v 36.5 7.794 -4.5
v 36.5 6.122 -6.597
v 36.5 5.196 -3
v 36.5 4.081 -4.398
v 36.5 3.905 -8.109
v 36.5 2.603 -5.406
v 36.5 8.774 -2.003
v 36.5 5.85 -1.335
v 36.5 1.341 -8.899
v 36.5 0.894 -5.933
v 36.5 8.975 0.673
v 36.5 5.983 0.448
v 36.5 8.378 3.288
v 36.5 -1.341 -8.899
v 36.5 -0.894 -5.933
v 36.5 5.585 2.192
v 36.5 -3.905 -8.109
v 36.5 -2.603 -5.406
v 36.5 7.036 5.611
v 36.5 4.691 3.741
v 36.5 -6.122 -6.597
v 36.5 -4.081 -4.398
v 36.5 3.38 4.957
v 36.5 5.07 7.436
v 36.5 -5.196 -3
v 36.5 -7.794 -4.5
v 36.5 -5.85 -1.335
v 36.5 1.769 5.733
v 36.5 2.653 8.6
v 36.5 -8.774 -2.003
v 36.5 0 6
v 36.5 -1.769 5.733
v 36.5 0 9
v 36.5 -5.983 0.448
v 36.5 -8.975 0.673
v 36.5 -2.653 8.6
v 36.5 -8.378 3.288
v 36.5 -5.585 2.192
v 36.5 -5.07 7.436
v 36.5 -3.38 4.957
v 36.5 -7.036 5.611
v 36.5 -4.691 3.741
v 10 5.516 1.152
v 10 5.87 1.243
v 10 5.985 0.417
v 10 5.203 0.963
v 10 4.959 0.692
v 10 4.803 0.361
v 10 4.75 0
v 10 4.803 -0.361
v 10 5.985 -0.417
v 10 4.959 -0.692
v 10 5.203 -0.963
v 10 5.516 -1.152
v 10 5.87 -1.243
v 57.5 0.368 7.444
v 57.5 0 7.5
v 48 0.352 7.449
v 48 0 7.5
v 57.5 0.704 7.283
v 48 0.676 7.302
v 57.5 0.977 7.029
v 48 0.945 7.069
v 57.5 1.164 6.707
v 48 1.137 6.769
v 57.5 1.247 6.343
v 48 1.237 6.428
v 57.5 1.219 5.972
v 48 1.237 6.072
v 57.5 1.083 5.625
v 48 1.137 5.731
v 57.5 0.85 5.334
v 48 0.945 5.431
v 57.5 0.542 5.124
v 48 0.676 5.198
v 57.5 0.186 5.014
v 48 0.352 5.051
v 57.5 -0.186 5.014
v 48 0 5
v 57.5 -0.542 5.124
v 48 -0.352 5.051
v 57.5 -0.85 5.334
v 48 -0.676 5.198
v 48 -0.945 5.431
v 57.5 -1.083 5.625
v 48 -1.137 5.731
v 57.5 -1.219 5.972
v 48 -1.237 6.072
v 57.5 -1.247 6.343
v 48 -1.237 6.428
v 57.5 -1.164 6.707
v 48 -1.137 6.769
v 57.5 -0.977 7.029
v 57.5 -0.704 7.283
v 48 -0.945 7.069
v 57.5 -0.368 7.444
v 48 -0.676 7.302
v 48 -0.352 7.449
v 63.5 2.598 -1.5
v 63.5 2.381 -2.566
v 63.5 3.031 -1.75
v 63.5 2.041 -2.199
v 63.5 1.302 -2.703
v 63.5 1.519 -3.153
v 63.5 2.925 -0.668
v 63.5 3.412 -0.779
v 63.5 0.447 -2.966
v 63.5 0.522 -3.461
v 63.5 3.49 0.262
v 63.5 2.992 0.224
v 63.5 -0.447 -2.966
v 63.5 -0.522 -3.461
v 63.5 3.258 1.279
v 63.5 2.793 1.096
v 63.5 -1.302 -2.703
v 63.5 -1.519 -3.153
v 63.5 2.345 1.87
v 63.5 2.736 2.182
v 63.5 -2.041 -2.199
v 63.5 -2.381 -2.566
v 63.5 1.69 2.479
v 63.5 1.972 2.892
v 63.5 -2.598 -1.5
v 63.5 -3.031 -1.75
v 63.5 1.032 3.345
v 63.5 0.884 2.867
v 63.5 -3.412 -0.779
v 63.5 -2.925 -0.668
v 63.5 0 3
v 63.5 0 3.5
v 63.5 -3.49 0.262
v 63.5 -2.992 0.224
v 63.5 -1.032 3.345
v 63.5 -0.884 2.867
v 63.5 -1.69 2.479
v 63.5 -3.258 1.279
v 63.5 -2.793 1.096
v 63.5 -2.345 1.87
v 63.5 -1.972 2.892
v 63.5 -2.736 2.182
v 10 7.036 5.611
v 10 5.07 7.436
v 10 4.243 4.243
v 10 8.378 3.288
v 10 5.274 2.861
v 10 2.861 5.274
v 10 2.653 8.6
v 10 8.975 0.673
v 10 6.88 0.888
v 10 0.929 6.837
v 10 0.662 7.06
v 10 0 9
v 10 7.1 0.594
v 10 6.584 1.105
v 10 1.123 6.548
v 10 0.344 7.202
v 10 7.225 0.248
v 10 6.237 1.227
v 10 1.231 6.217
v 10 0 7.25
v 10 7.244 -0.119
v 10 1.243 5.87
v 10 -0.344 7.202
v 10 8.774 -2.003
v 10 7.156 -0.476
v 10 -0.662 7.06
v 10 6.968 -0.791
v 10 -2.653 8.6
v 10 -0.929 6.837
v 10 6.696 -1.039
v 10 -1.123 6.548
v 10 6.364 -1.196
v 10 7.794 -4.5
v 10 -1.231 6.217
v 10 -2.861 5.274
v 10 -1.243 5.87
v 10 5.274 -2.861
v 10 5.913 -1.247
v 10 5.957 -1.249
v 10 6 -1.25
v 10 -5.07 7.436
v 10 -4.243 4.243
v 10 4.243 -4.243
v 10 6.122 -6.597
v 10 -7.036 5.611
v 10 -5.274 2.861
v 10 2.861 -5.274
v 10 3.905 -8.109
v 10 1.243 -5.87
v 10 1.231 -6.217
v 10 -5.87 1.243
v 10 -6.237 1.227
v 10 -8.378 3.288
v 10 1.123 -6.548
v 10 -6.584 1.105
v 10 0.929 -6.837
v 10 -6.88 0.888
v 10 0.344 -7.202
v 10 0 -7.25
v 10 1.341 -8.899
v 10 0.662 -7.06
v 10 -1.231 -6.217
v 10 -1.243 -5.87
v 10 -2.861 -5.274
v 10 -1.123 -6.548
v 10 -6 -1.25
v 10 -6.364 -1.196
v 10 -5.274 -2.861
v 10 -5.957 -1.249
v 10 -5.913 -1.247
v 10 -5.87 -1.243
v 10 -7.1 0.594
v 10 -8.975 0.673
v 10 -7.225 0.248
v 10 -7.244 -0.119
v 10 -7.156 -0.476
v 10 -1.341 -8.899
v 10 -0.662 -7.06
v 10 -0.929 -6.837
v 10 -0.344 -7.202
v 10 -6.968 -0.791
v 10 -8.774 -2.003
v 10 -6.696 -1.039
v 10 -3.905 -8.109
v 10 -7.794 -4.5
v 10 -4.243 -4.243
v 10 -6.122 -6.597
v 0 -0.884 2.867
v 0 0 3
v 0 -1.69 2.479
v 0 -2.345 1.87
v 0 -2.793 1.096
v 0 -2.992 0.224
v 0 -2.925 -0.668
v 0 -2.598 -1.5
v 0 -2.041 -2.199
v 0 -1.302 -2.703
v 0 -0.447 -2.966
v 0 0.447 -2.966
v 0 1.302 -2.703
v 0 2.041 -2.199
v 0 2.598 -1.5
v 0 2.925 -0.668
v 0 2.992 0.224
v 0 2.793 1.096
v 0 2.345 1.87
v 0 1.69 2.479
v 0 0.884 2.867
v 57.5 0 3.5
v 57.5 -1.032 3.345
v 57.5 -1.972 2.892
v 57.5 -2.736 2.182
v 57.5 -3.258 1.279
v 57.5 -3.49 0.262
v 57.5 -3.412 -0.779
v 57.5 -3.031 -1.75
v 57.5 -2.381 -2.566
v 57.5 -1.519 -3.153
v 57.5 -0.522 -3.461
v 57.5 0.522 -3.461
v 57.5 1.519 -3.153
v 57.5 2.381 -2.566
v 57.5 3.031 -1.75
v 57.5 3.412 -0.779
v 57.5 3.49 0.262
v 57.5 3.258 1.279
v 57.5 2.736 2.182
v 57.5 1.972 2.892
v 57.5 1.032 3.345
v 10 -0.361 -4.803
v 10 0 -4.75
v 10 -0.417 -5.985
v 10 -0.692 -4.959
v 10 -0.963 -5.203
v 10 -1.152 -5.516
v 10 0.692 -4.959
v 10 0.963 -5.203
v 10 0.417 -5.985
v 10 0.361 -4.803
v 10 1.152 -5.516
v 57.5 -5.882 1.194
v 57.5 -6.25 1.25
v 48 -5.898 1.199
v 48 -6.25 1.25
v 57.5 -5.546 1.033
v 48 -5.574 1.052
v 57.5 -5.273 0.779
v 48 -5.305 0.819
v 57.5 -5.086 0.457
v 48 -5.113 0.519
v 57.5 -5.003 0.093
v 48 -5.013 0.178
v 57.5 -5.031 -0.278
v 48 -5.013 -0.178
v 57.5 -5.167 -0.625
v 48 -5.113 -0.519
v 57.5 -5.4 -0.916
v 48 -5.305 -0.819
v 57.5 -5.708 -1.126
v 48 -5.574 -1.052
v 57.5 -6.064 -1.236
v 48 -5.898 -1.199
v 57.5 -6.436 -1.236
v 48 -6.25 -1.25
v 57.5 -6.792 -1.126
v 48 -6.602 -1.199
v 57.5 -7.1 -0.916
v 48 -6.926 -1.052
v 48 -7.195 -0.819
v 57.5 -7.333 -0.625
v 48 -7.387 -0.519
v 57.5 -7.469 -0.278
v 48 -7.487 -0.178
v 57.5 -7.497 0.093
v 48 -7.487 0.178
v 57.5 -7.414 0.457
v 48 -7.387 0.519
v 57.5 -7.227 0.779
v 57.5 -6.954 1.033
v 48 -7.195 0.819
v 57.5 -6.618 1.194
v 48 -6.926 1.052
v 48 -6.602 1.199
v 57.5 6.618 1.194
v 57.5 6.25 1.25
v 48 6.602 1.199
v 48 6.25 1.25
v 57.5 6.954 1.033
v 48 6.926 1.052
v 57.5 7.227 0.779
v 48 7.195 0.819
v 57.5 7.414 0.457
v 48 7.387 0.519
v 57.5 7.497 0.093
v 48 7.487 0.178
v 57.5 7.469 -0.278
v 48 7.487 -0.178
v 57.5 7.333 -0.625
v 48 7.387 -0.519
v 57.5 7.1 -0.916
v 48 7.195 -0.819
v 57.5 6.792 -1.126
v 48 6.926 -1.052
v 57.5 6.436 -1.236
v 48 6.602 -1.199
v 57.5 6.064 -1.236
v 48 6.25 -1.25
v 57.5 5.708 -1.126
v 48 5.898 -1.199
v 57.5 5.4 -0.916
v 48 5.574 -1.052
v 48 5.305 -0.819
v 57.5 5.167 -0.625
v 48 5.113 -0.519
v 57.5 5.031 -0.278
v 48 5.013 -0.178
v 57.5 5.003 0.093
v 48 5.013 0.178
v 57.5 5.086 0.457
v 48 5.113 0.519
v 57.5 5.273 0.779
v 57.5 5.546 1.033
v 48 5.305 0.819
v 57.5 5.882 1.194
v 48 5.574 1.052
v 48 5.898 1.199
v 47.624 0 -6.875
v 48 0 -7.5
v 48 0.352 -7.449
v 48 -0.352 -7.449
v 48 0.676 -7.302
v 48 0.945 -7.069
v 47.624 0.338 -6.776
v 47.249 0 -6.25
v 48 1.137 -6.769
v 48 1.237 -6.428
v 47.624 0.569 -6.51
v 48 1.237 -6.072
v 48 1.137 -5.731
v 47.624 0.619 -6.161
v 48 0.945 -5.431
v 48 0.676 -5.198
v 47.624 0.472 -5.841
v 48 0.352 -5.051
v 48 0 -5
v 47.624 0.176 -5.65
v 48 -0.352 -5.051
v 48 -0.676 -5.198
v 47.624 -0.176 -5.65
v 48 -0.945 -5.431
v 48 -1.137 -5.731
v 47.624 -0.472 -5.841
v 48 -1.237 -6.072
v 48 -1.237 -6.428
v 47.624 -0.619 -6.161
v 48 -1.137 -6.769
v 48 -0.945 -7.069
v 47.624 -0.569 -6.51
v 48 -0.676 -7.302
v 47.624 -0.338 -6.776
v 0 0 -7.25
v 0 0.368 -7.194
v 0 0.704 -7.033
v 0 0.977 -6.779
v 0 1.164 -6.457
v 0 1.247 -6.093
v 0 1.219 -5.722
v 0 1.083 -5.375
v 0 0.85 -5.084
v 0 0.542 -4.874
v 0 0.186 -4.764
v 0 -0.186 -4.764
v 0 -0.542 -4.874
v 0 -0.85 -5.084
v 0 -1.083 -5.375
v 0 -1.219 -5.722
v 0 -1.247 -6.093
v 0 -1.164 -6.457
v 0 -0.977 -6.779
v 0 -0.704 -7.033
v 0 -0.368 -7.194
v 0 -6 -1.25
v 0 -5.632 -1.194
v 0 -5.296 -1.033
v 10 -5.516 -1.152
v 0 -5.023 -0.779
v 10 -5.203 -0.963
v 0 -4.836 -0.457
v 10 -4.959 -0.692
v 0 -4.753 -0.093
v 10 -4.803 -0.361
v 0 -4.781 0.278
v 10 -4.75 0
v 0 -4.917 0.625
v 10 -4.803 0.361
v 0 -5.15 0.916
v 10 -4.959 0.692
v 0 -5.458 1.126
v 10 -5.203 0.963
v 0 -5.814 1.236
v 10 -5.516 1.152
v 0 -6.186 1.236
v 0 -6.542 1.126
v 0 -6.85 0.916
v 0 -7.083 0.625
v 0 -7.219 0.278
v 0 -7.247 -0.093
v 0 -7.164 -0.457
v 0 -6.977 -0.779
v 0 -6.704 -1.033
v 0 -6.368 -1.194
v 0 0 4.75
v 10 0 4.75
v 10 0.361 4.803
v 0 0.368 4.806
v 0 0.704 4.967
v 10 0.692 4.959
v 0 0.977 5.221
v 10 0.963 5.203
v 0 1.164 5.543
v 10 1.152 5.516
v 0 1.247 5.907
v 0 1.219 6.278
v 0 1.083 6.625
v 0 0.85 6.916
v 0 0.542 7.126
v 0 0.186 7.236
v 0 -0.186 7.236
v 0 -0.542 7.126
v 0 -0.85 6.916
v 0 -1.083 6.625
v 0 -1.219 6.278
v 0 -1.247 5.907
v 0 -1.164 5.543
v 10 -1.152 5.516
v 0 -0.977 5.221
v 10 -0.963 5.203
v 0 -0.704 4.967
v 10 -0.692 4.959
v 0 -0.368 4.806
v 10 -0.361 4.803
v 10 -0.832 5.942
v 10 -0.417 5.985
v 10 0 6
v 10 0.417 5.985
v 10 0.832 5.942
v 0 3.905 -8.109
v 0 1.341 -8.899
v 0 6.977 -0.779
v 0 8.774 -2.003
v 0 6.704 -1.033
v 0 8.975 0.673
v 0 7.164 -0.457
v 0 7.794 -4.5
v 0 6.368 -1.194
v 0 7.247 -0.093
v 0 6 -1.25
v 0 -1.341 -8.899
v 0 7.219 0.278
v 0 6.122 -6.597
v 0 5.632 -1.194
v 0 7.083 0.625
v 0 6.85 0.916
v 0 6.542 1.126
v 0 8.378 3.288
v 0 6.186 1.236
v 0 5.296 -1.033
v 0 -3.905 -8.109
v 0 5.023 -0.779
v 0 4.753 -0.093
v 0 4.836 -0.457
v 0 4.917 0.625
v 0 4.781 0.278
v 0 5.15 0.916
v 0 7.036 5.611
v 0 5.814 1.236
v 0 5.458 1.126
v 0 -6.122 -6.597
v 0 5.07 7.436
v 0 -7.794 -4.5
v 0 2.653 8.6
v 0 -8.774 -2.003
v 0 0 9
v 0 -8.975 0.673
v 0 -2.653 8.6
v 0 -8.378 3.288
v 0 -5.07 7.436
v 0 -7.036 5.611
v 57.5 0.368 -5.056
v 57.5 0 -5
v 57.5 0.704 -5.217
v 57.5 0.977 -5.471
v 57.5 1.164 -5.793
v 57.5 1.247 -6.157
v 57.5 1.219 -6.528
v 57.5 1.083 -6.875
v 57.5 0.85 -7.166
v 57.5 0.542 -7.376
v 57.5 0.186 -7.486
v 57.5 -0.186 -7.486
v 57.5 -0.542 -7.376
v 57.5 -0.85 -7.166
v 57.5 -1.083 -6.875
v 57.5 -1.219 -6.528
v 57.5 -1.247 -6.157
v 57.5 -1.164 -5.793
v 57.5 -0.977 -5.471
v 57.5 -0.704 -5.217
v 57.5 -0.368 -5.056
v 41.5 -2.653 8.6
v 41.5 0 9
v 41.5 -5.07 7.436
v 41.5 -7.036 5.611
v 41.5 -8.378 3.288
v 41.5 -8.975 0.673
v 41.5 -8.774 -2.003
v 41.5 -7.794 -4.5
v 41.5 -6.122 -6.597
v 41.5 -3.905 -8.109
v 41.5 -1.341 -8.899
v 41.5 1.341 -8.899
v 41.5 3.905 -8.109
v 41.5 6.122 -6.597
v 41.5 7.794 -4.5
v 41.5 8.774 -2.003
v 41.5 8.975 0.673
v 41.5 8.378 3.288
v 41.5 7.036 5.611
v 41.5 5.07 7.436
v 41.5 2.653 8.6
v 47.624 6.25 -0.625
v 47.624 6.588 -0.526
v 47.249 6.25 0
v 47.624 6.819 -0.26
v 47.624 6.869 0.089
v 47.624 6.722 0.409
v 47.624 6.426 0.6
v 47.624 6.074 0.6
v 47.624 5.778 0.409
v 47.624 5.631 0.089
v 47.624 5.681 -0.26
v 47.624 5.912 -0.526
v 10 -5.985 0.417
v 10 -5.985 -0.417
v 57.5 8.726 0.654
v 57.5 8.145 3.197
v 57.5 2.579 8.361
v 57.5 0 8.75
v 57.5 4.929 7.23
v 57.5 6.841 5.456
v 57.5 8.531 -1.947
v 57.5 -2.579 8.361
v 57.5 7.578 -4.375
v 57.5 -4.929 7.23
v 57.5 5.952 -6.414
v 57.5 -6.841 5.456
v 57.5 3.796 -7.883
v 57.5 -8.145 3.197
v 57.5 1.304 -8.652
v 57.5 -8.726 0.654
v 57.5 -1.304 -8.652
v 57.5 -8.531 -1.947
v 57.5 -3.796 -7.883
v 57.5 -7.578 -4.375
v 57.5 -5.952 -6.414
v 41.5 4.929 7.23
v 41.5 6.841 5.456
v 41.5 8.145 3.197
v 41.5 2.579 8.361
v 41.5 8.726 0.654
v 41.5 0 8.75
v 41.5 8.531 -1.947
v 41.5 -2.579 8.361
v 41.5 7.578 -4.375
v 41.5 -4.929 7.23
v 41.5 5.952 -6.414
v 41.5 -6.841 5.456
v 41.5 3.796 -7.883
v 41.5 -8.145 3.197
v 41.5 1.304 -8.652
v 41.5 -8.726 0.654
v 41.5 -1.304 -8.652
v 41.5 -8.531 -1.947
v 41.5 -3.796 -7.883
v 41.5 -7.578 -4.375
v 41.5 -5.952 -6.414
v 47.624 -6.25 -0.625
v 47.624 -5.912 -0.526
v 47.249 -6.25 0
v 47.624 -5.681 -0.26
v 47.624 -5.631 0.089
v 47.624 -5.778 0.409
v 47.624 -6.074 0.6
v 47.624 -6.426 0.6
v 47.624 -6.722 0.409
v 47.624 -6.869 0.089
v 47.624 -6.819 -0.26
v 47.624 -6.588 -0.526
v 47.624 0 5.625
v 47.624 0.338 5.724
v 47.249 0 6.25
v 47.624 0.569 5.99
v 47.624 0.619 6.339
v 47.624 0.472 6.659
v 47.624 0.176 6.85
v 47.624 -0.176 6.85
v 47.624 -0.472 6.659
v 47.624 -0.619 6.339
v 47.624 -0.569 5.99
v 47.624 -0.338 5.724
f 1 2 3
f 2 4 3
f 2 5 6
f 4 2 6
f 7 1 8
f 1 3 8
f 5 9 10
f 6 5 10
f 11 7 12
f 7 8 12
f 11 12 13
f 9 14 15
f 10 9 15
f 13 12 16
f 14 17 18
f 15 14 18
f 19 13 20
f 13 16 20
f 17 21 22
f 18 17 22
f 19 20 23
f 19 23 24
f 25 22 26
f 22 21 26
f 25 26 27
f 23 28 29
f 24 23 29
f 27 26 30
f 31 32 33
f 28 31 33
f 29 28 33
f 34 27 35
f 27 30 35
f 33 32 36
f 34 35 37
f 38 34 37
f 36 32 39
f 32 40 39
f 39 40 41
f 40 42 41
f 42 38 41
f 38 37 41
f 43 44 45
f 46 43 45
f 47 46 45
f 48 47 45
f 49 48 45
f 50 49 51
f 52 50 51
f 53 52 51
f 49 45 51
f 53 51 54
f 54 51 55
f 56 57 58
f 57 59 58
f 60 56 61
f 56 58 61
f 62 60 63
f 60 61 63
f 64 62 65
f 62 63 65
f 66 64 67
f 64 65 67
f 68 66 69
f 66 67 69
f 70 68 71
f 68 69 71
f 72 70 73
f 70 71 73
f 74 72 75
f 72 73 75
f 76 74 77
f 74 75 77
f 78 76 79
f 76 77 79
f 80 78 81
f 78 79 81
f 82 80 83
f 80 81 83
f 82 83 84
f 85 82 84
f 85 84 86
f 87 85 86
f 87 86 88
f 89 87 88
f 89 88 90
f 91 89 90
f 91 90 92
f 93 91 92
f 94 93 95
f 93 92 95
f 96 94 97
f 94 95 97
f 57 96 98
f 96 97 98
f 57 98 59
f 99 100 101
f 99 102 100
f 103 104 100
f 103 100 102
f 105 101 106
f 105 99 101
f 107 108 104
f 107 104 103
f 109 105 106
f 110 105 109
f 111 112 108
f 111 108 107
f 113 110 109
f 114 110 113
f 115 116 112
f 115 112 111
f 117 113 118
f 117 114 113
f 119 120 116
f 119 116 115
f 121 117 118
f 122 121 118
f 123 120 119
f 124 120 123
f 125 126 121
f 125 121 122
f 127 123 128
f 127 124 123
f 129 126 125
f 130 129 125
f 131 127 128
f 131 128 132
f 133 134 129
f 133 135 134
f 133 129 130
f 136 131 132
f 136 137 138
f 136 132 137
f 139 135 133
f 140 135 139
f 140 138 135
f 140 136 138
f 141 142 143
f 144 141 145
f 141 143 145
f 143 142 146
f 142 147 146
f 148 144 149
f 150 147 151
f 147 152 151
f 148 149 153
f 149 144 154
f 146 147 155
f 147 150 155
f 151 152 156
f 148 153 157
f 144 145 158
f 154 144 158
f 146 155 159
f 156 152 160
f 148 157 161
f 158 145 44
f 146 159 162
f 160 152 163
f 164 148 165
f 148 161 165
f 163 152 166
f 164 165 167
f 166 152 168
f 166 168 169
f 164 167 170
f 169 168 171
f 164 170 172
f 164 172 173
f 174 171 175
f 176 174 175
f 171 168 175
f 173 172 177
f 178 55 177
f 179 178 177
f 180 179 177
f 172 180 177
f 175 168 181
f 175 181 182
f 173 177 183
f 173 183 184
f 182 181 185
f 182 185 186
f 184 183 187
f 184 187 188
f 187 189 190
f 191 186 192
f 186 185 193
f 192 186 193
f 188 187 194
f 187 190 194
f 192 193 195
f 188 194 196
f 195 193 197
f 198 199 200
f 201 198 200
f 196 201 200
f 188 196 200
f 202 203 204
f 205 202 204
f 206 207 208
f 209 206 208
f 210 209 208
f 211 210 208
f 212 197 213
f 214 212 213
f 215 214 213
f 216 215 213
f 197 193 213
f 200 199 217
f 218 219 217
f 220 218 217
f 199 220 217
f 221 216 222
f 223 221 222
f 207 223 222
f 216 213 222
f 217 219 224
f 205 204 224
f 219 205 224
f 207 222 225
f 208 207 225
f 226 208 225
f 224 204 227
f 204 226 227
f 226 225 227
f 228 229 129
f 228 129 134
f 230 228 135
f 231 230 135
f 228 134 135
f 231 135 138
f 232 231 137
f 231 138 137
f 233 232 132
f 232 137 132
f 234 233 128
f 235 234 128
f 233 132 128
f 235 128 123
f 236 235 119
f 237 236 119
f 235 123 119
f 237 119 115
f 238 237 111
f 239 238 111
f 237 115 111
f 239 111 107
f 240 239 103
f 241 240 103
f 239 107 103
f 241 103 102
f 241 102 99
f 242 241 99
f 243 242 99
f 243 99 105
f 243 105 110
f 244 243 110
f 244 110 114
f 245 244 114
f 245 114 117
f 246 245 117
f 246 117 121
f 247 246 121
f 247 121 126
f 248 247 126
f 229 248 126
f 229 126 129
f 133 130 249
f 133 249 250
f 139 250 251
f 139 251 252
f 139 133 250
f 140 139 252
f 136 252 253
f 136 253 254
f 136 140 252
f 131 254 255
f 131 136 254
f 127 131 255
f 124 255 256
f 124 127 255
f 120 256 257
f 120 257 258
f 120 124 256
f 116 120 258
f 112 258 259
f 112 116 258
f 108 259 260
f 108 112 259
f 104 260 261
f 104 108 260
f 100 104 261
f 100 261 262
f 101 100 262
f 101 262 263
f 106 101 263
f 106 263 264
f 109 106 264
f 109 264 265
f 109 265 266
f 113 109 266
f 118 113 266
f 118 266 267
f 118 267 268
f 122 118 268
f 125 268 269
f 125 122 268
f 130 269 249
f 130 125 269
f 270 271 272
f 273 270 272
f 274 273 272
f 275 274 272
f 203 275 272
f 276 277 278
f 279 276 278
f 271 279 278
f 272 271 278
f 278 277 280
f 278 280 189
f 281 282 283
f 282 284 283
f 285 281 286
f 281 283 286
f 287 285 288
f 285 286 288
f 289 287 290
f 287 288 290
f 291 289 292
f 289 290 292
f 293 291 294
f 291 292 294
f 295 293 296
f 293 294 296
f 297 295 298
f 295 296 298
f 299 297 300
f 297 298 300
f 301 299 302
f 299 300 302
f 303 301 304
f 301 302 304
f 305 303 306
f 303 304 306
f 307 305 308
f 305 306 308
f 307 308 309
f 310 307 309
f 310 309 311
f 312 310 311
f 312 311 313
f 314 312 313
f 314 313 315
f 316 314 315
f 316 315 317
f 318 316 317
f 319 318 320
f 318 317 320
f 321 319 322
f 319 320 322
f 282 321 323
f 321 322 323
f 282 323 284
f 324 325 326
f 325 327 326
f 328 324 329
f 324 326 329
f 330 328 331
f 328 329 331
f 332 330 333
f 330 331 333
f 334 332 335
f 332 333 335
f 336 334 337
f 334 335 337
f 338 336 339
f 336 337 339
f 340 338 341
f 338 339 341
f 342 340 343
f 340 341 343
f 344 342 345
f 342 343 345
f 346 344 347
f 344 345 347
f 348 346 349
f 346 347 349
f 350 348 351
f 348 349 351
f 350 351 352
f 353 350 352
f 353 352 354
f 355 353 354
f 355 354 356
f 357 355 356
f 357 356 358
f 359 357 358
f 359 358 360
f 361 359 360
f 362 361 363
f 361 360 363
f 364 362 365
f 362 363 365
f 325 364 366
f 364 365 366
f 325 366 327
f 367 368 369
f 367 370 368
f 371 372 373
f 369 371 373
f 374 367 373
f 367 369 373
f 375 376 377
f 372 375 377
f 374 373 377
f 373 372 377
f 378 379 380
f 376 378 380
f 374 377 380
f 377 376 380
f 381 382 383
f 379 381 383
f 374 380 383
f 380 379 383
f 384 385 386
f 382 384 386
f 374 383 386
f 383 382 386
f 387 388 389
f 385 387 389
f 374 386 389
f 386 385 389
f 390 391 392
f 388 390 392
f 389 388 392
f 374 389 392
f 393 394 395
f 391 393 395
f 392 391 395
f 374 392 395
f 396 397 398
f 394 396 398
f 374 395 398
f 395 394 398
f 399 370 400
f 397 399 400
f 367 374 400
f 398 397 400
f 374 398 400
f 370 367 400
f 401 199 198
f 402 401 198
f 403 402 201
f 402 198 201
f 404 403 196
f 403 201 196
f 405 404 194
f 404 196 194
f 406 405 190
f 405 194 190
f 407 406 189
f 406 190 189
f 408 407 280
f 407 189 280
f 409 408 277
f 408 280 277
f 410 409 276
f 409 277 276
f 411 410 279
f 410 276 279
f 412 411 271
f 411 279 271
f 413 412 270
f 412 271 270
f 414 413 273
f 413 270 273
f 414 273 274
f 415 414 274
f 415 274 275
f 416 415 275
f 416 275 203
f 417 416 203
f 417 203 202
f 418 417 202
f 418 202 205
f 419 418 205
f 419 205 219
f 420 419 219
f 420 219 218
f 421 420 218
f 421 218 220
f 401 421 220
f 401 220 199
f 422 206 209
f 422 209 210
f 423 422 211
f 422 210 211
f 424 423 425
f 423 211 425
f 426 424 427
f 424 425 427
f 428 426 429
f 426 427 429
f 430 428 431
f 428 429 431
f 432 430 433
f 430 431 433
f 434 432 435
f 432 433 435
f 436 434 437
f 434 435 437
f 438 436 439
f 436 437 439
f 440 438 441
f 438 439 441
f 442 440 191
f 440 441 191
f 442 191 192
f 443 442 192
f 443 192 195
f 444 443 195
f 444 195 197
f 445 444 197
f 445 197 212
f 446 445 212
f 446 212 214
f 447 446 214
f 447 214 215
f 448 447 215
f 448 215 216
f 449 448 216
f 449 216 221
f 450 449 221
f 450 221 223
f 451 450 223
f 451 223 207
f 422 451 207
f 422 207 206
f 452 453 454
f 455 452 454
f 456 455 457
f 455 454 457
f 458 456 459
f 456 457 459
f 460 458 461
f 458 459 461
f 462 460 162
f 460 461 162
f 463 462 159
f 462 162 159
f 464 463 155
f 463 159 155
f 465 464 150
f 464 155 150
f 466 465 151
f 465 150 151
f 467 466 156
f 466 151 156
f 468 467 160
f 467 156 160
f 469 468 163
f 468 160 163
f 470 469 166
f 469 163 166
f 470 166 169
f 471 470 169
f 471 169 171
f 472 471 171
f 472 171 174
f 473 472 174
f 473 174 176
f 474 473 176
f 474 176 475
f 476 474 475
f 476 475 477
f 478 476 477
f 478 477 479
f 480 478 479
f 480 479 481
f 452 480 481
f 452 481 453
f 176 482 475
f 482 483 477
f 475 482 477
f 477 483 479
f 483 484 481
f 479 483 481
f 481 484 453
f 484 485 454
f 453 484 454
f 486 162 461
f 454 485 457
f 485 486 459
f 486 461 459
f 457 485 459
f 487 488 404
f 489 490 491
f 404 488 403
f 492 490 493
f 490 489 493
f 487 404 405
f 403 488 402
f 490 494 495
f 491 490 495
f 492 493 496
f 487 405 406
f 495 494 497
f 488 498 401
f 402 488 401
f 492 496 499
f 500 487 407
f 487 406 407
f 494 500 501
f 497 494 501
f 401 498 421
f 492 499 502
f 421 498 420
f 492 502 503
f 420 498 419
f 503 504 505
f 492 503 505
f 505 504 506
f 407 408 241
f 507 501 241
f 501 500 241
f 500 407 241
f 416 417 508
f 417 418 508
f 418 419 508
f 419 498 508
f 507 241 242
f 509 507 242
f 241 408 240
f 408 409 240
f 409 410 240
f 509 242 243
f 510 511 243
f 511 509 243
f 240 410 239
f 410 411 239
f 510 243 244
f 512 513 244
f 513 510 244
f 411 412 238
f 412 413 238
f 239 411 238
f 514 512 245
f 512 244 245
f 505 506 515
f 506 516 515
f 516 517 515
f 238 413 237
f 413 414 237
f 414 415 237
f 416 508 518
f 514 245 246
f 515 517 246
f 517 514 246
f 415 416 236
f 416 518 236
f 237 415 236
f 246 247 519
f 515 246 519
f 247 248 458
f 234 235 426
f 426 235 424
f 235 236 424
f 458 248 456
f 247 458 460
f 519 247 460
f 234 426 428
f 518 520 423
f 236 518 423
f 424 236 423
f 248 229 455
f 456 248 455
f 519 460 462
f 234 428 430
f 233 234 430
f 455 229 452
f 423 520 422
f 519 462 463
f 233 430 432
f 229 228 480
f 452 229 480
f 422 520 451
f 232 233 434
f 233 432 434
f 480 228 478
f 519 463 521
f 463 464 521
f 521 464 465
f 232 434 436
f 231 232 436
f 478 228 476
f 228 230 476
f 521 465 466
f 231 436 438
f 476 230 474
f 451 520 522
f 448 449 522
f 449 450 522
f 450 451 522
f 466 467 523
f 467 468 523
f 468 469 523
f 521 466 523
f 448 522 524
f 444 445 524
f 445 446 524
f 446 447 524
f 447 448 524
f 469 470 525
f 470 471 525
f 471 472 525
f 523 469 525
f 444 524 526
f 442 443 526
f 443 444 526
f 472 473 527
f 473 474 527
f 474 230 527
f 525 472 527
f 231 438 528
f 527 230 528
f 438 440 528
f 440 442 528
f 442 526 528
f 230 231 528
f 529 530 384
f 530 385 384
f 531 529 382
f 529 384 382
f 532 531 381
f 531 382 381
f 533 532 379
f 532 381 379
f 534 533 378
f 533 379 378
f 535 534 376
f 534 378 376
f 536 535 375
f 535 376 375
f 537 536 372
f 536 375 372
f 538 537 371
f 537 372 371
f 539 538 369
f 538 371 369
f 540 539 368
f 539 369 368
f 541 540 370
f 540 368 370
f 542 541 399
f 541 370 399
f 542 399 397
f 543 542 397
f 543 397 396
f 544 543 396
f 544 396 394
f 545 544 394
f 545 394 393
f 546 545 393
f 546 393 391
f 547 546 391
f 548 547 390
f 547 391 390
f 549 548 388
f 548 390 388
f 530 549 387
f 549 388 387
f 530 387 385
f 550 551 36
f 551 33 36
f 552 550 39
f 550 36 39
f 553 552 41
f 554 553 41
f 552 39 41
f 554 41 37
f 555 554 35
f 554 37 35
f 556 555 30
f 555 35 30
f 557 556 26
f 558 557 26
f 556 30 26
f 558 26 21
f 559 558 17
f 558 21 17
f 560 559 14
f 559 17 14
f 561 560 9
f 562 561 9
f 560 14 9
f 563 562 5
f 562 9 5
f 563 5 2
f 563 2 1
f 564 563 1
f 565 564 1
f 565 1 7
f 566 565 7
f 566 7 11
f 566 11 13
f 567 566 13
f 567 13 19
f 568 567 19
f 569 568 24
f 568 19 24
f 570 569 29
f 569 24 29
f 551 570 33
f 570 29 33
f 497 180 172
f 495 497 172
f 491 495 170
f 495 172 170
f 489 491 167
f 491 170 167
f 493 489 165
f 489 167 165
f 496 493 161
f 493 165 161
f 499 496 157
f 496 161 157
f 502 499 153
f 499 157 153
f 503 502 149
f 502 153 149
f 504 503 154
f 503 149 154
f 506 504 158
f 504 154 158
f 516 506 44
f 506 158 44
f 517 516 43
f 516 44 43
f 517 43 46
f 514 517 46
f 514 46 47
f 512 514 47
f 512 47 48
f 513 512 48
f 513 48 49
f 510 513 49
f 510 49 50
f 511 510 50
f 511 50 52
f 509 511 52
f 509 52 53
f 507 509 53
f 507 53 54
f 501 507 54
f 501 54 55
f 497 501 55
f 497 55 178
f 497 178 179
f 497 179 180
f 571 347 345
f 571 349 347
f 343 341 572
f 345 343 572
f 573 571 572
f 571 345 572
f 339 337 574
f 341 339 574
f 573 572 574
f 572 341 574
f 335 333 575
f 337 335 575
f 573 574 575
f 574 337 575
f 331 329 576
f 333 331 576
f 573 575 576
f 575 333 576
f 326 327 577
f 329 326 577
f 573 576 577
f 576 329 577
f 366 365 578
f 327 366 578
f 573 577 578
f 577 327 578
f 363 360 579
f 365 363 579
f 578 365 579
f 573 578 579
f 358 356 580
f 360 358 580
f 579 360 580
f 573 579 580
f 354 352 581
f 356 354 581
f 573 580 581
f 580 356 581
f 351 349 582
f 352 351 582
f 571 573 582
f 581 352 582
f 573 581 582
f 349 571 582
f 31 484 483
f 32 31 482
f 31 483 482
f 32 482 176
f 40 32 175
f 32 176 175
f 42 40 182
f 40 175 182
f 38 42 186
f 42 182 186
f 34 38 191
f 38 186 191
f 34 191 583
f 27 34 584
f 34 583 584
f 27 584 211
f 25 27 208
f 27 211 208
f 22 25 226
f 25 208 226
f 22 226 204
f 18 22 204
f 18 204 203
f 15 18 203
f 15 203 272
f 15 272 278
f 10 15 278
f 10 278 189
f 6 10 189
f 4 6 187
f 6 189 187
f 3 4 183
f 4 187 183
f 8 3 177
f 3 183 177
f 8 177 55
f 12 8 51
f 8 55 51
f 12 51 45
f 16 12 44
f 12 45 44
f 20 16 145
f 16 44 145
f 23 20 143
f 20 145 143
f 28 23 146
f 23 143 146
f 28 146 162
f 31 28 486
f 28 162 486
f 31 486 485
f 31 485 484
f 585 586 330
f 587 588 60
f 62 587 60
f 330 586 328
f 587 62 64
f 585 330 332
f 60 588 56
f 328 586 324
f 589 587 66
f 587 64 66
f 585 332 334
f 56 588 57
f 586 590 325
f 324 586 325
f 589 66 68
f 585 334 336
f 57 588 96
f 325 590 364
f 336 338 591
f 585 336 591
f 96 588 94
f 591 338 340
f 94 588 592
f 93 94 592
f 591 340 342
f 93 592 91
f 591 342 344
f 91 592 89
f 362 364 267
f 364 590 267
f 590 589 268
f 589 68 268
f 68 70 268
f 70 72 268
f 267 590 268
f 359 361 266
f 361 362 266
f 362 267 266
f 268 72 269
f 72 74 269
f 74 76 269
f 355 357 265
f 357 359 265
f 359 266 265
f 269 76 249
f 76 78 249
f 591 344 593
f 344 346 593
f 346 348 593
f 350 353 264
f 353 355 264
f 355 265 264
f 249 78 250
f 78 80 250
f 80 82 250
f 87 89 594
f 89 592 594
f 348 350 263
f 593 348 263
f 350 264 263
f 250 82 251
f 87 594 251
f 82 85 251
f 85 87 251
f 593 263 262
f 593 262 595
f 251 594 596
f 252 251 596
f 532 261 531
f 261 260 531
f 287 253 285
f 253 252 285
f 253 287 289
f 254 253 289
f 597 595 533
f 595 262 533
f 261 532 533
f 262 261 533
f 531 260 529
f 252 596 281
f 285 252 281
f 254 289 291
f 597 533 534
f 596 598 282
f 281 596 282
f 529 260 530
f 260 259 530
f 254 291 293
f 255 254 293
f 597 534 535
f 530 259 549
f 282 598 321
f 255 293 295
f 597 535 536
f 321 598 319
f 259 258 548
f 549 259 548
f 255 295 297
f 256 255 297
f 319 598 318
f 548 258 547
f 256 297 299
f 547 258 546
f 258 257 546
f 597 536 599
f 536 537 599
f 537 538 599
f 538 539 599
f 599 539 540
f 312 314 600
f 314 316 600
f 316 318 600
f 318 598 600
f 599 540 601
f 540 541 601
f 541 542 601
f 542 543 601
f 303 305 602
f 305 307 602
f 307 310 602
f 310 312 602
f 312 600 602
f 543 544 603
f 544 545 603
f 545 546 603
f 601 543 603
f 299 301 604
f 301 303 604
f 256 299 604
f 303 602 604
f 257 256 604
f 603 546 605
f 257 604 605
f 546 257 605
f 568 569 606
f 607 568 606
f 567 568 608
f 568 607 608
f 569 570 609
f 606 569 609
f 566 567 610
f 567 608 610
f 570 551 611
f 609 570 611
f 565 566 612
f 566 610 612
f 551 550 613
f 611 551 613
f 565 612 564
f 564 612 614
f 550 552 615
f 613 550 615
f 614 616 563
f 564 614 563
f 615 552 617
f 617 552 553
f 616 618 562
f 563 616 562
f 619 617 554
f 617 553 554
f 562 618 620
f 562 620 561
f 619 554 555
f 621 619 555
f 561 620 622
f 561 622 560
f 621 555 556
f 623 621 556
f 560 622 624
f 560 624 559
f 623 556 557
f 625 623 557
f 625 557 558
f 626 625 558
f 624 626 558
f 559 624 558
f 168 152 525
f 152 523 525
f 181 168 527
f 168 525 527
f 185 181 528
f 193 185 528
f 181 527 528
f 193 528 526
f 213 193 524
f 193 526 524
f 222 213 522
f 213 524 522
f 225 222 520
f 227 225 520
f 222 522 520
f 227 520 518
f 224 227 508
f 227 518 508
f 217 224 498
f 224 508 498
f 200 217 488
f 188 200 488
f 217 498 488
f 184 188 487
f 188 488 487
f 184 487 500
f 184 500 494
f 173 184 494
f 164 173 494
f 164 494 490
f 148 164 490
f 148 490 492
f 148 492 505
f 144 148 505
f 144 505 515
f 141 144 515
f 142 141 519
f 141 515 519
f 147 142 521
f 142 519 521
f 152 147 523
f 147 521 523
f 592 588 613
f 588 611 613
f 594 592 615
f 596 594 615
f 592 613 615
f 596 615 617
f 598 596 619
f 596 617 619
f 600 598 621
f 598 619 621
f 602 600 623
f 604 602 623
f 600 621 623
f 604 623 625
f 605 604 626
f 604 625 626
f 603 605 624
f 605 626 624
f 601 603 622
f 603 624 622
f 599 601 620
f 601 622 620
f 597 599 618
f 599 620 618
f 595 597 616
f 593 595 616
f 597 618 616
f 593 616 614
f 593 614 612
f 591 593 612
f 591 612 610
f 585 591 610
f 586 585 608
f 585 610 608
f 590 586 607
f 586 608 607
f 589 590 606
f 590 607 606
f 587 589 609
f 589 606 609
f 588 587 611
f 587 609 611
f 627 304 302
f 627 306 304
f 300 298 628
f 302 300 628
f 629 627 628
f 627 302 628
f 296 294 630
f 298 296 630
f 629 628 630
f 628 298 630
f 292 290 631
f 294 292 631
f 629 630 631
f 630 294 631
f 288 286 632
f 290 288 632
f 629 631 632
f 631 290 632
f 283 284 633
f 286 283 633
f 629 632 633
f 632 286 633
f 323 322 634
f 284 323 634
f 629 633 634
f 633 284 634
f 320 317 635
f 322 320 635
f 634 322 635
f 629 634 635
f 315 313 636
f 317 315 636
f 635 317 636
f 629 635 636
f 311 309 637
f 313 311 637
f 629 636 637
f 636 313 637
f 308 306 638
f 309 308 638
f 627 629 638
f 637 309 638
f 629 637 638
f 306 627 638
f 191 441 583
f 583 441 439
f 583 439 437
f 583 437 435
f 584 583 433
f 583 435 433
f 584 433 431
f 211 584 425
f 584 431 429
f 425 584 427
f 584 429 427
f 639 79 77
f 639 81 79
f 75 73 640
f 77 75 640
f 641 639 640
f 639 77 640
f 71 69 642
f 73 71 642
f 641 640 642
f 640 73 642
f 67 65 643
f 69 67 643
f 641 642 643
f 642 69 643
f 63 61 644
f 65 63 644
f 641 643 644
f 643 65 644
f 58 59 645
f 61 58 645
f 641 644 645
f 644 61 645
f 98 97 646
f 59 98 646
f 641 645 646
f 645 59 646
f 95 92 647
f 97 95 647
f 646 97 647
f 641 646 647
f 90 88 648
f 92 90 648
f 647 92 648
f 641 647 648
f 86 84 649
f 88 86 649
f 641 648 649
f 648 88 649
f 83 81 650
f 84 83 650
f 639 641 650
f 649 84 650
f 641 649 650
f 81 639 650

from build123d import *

# Parameters (mm, degrees)
HOLE_WIZARD_M3_1_D     = 2.5
HOLE_WIZARD_M3_1_DEPTH = 10
HOLE_WIZARD_M3_2_D     = 2.5
HOLE_WIZARD_M3_2_DEPTH = 9.5
HOLE_WIZARD_M3_2_TIP   = 0.751075774
EXTRUDE_START          = 6
SKETCH_9_R             = 3.5
SKETCH_9_R_2           = 3
EXTRUDE_1_DEPTH        = 6


with BuildPart() as part:
    # 草图1 → 旋转1 (revolve)
    with BuildSketch(Plane.XY, mode=Mode.PRIVATE) as revolve_1_sk:
        Polygon((0, 9), (0, 3), (57.5, 3), (57.5, 8.75), (41.5, 8.75), (41.5, 9), (36.5, 9), (36.5, 6), (10, 6), (10, 9), align=None)
    revolve(revolve_1_sk.sketch.rotate(Axis((0, 0, 0), (1, 0, 0)), 90), axis=Axis((0, 0, 0), (1, 0, 0)))

    # M3 螺纹孔1
    with Locations(Plane.ZY):
        with Locations((0, 6), (6, 0), (0, -6), (-6, 0)):
            Hole(HOLE_WIZARD_M3_1_D / 2, depth=HOLE_WIZARD_M3_1_DEPTH)

    # M3 螺纹孔2
    with Locations(Plane(origin=(57.5, 0, 0), x_dir=(0, 0, -1), z_dir=(1, 0, 0))):
        with Locations((0, 6.25), (6.25, 0), (0, -6.25), (-6.25, 0)):
            Hole(HOLE_WIZARD_M3_2_D / 2, depth=HOLE_WIZARD_M3_2_DEPTH)
            with Locations((0, 0, -(HOLE_WIZARD_M3_2_DEPTH + HOLE_WIZARD_M3_2_TIP / 2))):  # 118° drill point
                Cone(0, HOLE_WIZARD_M3_2_D / 2, HOLE_WIZARD_M3_2_TIP, mode=Mode.SUBTRACT)

    # 草图9 → 凸台-拉伸1 (add)
    with BuildSketch(Plane(origin=(57.5, 0, 0), x_dir=(0, 0, -1), z_dir=(1, 0, 0)).offset(EXTRUDE_START)):
        with Locations(Location((0, 0, 0), (0, 0, 180))):
            Circle(SKETCH_9_R)
        with Locations(Location((0, 0, 0), (0, 0, 180))):
            Circle(SKETCH_9_R_2, mode=Mode.SUBTRACT)
    extrude(amount=-EXTRUDE_1_DEPTH)


solid = part.part
